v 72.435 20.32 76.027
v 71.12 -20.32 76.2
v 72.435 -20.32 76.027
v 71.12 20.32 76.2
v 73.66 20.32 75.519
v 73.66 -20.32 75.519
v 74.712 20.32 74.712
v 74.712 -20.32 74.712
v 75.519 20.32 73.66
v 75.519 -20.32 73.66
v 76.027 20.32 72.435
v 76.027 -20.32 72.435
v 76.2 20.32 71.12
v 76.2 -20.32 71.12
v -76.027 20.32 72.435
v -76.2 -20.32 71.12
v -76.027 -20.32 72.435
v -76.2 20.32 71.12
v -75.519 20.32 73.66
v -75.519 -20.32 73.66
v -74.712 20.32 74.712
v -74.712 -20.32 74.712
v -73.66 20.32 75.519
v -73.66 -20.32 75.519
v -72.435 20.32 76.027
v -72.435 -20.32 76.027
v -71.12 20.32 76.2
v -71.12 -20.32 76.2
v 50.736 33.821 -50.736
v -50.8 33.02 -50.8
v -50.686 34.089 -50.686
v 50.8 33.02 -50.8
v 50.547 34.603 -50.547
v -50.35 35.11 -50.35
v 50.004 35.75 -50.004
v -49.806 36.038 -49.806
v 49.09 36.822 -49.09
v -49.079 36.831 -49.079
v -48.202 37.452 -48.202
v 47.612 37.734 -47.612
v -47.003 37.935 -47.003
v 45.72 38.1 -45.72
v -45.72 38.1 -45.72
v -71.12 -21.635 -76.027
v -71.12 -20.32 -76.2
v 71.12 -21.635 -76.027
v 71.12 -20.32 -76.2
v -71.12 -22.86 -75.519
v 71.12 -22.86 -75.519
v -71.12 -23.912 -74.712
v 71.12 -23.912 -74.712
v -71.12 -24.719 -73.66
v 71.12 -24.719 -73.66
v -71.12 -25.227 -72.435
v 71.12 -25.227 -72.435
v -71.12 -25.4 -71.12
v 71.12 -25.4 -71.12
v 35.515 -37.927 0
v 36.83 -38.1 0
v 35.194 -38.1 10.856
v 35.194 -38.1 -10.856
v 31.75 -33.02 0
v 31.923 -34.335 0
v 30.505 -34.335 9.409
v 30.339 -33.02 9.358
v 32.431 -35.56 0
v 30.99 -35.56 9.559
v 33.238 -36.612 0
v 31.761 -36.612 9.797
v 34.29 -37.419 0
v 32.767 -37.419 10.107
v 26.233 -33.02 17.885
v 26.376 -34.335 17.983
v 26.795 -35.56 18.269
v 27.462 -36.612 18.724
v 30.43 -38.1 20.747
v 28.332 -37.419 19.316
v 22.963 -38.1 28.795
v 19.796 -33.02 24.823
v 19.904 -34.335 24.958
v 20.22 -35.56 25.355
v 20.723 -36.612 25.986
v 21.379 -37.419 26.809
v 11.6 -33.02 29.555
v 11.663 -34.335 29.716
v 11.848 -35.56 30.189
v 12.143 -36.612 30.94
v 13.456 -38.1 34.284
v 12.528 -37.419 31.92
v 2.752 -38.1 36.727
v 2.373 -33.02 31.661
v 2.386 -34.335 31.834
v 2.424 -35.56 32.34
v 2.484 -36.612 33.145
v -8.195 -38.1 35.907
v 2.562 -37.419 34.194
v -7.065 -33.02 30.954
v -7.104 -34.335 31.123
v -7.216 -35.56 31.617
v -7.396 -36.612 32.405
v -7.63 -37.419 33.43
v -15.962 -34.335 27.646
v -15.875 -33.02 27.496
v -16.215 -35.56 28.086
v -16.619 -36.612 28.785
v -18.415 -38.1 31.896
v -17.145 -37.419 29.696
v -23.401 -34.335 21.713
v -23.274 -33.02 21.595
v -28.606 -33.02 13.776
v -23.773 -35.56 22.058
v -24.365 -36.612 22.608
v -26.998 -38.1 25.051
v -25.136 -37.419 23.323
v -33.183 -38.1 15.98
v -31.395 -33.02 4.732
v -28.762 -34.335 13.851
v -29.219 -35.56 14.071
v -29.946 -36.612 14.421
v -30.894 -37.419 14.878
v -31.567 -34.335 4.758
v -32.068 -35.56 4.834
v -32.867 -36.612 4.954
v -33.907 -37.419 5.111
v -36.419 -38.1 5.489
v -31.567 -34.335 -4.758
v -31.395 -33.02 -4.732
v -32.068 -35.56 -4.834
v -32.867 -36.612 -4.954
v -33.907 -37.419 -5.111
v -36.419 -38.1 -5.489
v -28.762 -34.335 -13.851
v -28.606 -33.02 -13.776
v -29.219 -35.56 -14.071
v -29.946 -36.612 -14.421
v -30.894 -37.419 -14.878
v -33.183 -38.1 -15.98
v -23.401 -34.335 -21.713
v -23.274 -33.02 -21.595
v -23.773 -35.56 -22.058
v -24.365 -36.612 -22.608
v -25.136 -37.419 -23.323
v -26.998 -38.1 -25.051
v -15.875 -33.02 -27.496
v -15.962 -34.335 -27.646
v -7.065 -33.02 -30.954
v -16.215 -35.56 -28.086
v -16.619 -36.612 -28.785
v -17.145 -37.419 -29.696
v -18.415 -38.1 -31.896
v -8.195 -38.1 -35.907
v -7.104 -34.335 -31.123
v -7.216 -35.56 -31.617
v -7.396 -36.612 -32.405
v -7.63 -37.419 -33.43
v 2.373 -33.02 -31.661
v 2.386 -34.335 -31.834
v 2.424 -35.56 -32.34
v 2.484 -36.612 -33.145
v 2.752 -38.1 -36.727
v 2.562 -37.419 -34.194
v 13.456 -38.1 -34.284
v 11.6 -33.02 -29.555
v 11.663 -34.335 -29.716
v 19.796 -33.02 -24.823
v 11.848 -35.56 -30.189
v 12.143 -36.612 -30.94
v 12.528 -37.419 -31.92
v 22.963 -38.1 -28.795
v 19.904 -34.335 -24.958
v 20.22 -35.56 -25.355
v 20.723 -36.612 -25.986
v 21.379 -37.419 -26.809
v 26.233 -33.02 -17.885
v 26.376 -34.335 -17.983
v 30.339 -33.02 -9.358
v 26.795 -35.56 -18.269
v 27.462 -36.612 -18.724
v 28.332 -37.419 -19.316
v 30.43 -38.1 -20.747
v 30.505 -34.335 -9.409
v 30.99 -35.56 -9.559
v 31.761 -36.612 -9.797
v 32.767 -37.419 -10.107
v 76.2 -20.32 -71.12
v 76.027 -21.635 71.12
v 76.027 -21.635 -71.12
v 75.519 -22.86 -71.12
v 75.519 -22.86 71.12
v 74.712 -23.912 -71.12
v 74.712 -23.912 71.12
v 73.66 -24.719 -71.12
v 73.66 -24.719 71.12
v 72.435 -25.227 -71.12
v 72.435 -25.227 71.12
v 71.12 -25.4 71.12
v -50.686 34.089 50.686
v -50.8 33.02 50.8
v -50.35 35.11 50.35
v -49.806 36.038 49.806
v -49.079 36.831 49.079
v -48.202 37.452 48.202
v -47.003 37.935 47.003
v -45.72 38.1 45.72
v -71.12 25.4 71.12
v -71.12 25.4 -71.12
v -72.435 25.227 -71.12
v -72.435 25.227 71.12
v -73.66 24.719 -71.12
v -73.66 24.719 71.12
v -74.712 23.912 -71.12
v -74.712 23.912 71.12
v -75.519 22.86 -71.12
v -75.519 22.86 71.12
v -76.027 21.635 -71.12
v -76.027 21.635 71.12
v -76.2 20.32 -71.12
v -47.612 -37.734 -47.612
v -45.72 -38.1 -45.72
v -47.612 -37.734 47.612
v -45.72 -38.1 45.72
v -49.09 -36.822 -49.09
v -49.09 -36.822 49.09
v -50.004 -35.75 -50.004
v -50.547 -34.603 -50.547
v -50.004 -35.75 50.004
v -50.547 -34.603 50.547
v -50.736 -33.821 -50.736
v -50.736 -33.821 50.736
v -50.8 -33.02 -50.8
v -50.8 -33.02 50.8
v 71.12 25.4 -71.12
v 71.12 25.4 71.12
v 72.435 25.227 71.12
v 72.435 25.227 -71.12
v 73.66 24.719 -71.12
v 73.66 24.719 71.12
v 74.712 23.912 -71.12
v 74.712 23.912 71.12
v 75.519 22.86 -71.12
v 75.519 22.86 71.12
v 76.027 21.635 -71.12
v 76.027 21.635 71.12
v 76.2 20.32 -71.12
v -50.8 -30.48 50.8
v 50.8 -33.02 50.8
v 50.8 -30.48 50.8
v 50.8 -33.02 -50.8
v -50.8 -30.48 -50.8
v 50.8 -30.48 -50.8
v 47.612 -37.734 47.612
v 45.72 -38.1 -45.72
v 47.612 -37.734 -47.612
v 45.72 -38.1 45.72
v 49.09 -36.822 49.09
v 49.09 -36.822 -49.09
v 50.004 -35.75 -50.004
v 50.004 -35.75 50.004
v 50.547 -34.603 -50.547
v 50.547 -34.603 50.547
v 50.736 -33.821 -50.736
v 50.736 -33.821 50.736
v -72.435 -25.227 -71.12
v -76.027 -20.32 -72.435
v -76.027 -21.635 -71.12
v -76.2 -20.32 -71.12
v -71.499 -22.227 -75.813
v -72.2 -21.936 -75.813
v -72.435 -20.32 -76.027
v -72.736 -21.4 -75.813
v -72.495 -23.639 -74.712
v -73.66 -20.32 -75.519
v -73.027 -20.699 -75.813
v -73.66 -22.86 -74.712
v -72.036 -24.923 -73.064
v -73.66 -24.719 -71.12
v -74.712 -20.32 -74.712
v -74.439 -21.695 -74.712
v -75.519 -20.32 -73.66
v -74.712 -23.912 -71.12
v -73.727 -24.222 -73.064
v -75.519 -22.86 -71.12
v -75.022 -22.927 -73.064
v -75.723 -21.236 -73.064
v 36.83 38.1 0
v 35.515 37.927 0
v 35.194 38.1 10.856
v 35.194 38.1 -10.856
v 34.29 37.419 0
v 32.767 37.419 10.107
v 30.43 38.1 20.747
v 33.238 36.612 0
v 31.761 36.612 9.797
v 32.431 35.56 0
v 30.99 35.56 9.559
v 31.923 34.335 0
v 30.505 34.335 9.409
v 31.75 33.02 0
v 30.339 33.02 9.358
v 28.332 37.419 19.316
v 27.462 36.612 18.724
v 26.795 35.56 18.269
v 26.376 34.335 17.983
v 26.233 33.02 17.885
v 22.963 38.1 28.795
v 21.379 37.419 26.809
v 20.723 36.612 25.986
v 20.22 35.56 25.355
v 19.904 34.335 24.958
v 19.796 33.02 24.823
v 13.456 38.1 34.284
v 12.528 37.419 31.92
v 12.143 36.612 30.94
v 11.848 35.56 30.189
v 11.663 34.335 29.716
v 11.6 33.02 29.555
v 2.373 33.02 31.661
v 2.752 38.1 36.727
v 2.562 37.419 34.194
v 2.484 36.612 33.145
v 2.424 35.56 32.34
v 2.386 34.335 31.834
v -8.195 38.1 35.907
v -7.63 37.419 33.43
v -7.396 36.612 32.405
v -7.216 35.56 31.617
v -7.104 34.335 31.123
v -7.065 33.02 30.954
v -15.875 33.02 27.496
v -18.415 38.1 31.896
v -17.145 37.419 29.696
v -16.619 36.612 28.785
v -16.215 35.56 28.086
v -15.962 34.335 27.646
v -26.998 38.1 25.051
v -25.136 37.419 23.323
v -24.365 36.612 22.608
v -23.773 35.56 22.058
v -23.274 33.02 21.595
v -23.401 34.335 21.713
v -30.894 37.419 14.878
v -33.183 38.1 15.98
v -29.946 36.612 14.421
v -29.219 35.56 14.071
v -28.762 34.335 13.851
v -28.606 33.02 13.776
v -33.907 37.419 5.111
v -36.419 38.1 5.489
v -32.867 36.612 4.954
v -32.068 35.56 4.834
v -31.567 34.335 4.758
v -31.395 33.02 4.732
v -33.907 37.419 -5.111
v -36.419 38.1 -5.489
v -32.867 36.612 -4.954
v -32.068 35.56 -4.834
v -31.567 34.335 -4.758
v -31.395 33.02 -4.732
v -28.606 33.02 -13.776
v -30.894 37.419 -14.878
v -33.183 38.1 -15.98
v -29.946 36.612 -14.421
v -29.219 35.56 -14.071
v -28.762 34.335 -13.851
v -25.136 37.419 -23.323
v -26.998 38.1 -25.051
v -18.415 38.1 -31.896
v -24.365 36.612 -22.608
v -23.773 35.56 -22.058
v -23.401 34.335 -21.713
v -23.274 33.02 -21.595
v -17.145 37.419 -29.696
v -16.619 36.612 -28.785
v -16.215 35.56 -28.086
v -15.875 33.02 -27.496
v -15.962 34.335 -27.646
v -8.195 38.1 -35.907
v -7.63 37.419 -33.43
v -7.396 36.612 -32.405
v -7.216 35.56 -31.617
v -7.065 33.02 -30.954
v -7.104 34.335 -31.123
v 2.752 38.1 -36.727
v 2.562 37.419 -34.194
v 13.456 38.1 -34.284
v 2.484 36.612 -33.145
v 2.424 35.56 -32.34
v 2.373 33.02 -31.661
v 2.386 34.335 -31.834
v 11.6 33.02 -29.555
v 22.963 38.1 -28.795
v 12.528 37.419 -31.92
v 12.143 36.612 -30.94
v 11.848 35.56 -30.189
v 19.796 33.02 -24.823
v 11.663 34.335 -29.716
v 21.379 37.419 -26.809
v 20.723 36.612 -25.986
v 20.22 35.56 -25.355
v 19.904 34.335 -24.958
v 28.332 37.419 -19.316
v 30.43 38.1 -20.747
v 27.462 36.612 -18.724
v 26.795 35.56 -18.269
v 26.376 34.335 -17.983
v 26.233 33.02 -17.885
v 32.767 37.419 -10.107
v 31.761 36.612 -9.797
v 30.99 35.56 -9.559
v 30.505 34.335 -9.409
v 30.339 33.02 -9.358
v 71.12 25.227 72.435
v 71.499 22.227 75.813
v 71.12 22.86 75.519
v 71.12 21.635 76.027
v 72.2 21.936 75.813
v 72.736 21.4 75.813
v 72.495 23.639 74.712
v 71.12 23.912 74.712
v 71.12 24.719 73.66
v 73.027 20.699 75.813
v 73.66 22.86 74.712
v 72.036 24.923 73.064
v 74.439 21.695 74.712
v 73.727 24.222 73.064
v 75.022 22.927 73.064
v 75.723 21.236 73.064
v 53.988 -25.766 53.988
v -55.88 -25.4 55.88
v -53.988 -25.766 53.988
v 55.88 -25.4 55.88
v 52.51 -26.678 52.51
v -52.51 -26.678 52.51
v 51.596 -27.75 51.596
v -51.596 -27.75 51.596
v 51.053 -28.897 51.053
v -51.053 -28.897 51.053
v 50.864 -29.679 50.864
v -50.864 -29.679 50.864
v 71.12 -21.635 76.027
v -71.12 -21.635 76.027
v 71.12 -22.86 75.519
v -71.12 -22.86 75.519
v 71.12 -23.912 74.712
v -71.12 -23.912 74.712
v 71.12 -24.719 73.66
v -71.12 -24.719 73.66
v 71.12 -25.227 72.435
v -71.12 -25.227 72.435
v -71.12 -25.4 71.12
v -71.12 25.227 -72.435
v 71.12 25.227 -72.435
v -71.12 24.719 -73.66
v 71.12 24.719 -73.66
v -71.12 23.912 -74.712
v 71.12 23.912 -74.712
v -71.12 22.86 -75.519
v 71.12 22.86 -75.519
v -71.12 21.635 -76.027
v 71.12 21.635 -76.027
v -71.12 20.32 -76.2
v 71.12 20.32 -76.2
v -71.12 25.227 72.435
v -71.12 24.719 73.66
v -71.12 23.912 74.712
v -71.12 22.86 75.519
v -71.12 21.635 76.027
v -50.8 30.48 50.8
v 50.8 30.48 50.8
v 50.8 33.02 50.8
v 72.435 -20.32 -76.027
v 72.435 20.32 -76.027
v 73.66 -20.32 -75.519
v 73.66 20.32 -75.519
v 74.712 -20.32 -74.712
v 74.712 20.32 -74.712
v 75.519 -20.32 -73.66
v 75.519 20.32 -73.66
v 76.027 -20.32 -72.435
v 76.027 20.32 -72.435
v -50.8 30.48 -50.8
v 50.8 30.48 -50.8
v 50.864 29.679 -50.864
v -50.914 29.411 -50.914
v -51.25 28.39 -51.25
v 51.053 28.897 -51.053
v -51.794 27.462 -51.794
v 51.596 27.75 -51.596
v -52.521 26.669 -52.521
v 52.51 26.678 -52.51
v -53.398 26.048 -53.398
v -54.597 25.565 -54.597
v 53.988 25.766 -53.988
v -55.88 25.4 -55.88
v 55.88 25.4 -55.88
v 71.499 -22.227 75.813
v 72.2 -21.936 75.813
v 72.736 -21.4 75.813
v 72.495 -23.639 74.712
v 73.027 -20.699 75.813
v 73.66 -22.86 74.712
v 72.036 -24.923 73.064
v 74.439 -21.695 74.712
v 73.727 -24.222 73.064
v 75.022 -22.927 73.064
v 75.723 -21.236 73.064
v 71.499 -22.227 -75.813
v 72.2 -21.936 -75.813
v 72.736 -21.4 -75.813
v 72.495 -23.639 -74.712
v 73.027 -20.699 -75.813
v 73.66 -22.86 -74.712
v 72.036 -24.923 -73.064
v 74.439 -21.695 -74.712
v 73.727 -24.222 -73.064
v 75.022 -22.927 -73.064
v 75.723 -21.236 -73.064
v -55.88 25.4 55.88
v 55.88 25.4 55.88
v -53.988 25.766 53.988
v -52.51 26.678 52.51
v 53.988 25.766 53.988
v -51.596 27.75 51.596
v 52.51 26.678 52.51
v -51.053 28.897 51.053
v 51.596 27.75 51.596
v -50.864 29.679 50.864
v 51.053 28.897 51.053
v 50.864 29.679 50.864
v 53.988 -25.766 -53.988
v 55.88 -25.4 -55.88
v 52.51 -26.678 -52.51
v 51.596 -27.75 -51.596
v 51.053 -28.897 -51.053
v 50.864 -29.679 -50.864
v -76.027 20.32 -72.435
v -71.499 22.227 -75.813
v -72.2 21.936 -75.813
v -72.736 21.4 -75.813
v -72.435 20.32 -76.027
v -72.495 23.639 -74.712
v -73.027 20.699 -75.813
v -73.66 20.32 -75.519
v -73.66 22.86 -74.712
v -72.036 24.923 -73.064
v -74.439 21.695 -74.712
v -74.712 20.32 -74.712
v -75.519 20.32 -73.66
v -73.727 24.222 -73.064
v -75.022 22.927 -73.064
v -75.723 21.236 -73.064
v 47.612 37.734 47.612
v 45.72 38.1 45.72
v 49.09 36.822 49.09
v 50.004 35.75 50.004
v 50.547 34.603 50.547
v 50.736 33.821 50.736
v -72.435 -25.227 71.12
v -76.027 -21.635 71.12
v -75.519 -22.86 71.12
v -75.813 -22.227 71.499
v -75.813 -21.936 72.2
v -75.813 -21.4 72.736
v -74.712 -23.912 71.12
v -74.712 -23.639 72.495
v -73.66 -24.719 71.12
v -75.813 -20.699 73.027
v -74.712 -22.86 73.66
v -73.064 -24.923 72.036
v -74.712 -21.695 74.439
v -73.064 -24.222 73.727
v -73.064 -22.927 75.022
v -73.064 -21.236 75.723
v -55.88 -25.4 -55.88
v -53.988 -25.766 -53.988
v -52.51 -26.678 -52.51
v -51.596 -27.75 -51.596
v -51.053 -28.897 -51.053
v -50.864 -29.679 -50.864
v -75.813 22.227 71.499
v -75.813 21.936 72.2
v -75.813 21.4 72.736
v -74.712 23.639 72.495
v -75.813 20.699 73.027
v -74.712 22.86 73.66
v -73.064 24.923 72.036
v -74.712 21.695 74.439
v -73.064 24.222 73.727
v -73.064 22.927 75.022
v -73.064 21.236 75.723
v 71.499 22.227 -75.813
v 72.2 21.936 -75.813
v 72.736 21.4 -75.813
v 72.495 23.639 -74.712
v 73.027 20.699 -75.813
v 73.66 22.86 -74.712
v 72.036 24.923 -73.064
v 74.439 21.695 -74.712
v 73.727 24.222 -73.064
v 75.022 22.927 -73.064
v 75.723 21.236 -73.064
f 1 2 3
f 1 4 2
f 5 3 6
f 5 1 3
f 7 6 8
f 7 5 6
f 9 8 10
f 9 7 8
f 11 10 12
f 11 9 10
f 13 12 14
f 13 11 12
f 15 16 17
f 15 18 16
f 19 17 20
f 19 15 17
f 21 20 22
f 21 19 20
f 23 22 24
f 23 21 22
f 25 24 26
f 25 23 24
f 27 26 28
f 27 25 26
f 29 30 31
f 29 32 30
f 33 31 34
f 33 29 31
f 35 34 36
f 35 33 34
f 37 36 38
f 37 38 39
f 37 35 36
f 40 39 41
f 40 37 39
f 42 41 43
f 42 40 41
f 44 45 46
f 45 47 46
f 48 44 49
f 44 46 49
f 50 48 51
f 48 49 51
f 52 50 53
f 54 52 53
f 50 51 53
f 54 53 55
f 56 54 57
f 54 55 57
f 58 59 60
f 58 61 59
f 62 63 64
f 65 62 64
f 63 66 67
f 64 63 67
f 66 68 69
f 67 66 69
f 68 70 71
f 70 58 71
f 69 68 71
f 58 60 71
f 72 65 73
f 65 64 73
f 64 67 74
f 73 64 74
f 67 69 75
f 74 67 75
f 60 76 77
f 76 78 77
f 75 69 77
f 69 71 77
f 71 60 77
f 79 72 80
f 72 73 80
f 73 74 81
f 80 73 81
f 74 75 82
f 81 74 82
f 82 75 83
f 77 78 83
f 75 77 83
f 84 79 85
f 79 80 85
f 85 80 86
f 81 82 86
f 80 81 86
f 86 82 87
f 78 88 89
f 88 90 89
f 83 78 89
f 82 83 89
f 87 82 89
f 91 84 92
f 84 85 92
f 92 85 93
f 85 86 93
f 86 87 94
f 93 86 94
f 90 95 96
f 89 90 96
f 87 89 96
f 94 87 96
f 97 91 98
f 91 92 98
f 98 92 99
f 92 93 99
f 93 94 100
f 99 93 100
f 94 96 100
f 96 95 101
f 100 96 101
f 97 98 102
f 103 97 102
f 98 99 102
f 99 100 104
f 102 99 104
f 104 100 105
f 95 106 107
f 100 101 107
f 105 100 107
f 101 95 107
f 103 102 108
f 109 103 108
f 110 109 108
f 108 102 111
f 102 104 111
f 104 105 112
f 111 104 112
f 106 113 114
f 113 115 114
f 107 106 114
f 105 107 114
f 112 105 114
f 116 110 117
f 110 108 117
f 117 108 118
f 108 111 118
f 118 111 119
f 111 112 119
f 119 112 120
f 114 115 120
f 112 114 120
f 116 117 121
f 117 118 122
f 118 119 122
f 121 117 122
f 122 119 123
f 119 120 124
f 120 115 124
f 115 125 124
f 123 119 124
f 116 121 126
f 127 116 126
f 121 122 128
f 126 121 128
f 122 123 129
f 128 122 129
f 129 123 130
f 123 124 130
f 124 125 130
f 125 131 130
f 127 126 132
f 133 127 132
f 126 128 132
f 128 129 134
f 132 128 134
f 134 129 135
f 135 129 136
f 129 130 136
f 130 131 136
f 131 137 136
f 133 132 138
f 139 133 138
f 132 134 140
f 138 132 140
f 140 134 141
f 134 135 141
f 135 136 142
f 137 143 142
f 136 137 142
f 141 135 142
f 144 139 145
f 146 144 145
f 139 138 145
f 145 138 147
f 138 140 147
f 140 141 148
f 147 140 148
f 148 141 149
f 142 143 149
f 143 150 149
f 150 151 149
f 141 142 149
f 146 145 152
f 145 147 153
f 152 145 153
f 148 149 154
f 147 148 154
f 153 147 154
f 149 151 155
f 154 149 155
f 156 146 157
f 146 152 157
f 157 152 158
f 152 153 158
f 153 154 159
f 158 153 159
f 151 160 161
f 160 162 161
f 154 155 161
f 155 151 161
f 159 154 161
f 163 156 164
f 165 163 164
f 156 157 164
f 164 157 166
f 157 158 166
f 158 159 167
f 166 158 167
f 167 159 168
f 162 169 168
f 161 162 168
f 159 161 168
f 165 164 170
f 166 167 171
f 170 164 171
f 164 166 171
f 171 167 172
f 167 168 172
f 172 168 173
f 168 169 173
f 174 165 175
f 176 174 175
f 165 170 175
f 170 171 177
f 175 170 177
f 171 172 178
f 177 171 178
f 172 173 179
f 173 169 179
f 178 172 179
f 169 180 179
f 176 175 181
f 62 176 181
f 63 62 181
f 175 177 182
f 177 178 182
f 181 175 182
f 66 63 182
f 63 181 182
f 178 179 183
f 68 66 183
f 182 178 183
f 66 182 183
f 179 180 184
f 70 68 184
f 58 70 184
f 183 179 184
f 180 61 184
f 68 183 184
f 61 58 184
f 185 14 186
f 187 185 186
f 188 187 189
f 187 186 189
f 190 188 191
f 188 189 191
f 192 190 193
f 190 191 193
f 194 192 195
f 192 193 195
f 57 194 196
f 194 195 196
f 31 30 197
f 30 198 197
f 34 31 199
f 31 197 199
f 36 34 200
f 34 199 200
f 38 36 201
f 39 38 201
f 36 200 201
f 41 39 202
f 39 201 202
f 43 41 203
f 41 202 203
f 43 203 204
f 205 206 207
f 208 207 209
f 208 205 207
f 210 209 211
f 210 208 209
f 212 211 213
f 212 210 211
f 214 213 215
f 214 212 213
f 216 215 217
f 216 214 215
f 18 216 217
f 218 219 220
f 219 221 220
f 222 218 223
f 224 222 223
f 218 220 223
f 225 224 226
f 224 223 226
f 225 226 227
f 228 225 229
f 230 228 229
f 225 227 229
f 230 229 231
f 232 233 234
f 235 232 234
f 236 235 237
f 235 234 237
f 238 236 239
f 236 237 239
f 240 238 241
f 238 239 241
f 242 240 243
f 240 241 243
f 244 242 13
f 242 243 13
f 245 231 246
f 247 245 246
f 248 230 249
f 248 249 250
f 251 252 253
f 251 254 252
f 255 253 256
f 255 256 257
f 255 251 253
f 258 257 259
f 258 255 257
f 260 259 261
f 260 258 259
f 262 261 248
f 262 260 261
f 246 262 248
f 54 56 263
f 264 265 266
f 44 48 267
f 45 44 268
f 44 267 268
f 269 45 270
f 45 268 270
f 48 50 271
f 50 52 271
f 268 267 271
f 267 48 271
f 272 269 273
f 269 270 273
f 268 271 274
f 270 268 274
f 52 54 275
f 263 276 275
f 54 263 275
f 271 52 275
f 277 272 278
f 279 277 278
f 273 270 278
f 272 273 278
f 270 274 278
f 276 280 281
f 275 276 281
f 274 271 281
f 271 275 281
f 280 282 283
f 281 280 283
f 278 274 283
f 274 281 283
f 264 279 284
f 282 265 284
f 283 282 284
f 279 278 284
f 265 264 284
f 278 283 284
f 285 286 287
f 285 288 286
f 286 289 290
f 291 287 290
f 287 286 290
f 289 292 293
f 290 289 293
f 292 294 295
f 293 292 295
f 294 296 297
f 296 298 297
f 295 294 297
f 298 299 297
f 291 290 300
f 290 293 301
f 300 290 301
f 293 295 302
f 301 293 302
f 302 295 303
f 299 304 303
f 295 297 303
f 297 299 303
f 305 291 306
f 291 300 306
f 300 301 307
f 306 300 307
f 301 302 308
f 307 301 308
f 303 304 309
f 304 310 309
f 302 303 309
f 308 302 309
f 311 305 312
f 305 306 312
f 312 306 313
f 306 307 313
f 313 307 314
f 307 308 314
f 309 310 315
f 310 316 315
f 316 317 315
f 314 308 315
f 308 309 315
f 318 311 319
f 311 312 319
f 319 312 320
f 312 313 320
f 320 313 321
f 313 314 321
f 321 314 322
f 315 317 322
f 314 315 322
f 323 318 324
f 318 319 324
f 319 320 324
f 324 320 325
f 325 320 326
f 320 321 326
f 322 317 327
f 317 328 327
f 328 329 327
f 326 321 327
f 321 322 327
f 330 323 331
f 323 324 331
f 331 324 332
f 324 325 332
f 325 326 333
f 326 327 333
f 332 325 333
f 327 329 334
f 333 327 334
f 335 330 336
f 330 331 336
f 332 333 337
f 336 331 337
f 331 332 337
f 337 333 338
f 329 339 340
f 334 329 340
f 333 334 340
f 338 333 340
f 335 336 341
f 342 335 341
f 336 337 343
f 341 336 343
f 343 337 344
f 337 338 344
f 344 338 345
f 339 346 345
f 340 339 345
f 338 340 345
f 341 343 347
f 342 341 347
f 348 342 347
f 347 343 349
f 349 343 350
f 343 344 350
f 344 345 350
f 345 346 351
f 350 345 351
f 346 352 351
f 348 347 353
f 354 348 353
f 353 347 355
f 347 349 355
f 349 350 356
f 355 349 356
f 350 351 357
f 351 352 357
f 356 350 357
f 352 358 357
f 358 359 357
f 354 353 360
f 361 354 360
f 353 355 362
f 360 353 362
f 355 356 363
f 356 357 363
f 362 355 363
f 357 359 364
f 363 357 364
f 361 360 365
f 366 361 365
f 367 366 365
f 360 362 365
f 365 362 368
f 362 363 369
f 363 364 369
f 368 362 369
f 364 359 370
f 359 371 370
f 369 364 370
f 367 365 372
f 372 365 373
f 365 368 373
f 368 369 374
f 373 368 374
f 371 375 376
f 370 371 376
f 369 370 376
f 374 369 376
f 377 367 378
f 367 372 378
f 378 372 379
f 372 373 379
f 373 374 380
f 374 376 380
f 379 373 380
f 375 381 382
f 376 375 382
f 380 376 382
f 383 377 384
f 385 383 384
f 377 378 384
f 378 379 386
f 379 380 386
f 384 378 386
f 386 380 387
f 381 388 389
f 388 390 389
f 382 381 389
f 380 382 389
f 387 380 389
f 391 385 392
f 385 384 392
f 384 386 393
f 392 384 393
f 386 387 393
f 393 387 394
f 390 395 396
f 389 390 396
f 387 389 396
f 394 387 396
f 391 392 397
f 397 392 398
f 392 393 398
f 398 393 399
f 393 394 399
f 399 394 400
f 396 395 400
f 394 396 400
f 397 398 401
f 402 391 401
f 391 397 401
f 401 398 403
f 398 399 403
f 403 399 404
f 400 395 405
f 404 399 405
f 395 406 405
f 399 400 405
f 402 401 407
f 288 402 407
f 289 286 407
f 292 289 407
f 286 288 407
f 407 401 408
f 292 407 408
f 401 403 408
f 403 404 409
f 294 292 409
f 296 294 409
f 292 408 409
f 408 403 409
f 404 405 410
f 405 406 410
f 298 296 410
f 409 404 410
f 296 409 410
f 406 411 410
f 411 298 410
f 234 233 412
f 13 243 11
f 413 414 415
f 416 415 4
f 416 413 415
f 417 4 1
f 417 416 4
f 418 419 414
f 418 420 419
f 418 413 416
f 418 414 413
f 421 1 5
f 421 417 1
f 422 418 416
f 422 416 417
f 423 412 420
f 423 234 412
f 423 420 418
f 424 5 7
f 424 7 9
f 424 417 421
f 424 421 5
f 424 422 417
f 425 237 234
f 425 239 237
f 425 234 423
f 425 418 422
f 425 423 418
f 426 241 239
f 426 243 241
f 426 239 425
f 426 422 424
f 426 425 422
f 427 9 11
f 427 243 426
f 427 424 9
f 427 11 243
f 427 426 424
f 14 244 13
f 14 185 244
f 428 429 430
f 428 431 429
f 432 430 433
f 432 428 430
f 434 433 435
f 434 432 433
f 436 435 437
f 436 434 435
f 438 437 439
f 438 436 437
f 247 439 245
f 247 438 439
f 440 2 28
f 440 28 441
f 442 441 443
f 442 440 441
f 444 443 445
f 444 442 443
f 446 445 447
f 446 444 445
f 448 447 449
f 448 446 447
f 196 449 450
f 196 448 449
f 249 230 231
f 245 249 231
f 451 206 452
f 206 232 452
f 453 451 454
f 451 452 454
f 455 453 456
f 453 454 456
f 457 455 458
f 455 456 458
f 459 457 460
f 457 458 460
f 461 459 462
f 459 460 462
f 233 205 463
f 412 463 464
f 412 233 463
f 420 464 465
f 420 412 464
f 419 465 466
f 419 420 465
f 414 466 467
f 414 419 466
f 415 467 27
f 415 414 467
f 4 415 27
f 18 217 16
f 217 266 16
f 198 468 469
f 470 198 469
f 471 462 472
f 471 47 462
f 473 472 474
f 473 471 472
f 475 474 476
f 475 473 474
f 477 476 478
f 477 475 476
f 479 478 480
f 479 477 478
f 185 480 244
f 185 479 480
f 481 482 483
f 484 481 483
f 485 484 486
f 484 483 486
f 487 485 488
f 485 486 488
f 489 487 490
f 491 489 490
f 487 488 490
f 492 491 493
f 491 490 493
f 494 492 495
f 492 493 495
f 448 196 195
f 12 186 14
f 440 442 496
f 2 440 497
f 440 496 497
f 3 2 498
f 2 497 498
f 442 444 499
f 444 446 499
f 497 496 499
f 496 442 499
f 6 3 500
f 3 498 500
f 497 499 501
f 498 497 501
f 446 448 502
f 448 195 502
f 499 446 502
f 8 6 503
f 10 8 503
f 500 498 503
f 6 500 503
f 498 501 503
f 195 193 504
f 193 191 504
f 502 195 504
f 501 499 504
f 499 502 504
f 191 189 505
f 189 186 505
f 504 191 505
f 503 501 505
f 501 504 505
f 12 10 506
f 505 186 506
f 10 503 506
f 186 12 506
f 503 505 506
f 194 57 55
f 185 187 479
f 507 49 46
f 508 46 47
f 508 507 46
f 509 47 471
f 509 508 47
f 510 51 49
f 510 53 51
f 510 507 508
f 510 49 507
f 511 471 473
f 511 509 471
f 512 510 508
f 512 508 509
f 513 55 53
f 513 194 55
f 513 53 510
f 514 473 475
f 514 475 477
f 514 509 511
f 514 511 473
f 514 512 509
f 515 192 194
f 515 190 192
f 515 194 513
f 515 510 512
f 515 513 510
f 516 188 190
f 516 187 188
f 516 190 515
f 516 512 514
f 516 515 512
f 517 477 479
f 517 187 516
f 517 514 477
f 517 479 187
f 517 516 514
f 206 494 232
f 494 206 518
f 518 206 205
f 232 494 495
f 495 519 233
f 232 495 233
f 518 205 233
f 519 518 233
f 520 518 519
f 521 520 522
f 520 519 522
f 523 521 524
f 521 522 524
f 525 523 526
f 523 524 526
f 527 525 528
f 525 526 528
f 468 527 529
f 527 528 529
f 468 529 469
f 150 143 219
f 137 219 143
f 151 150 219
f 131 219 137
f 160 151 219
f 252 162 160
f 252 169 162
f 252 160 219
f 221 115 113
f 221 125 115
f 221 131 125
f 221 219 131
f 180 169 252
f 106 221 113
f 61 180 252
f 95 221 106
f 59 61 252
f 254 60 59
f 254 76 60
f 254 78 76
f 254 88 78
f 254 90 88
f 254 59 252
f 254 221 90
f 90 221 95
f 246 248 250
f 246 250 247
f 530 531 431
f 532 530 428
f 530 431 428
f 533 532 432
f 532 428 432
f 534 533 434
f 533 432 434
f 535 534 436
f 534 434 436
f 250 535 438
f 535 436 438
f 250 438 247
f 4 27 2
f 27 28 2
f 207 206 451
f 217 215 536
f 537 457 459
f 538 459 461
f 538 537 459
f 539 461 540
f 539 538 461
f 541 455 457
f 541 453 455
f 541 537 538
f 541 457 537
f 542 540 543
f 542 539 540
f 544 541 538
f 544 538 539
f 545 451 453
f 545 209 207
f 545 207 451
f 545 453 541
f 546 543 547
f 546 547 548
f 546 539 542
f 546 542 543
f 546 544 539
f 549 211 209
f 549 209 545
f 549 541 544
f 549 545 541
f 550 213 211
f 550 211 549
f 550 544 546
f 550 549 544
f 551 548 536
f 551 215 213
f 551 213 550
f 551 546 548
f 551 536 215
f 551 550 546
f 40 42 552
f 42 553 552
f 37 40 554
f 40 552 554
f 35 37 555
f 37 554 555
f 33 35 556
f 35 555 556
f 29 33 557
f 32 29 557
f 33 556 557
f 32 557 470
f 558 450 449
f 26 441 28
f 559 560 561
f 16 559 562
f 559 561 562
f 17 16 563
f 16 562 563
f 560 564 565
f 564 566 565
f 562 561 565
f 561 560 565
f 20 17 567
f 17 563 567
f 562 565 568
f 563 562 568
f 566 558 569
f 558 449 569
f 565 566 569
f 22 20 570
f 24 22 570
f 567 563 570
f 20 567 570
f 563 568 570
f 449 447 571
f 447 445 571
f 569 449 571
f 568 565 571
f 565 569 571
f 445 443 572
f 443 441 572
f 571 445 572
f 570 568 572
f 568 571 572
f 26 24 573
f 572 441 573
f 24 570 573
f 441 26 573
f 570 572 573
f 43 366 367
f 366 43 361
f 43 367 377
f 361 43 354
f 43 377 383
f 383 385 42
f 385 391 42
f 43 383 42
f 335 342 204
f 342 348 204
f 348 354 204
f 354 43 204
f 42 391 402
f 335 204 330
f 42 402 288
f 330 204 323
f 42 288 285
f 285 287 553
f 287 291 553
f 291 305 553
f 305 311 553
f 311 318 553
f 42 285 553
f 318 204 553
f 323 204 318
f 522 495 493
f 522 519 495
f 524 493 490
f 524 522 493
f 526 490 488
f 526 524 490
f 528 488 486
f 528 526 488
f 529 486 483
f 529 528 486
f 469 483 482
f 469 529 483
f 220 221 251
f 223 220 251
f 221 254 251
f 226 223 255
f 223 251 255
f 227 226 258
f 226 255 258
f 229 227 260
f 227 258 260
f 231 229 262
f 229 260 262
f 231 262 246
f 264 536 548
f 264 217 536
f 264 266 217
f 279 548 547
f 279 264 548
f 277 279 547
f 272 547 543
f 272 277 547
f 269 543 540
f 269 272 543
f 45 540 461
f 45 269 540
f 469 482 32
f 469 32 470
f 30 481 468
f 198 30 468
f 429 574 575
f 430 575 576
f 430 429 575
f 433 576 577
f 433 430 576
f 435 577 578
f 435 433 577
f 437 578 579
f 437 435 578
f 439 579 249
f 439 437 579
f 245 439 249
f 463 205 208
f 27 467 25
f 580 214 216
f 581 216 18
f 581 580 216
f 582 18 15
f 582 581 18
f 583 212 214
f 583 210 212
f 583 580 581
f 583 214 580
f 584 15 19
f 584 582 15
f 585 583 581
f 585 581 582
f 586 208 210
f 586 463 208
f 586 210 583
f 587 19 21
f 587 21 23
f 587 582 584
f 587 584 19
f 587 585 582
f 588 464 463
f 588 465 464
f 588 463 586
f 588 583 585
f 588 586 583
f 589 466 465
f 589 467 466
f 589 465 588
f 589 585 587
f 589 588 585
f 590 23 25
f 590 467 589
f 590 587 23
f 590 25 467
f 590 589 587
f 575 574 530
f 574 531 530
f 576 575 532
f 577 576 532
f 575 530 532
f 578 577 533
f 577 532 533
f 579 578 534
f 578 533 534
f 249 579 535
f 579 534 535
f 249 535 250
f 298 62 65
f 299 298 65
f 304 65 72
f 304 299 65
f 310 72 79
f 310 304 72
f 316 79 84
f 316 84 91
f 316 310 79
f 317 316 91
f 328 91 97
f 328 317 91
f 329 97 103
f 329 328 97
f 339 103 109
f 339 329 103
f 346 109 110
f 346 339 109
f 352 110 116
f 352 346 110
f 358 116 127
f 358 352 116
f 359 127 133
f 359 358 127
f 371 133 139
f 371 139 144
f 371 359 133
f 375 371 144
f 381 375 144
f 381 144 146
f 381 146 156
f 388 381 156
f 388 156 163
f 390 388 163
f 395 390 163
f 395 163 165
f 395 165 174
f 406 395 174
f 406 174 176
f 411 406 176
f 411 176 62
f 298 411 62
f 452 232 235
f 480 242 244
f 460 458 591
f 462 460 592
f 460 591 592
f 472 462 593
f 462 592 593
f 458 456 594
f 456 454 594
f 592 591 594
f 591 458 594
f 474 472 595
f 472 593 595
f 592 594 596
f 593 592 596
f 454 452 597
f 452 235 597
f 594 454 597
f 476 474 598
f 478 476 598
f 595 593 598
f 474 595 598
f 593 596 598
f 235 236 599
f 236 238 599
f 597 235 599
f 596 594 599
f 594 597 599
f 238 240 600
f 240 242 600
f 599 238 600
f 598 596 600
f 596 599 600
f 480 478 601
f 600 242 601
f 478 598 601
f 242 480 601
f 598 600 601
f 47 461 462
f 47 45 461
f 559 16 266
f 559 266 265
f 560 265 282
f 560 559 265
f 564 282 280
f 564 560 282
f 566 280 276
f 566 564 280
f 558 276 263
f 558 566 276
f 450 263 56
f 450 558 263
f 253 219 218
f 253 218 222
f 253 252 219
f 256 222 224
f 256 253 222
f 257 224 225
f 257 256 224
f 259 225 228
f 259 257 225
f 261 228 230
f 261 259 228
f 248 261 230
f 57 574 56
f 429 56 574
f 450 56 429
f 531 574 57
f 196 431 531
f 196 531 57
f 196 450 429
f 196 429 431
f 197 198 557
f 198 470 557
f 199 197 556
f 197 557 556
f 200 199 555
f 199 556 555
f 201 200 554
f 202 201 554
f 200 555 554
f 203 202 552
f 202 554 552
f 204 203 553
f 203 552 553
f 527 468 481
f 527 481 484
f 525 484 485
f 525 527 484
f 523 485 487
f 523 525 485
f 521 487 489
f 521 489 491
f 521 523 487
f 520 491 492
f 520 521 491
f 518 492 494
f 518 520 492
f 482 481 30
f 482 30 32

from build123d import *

# Parameters (mm, degrees)
F0_W     = 101.6
F0_H     = 101.6
F0_R     = 31.75
F1_DEPTH = 38.1
F0_W_2   = 152.4
F0_H_2   = 152.4
F2_DEPTH = 25.4
F3_R     = 5.08


with BuildPart() as f1:
    # F0 (on Front) → F1 (new body, symmetric)
    with BuildSketch(Plane.XZ):
        Rectangle(F0_W, F0_H)
        Circle(F0_R, mode=Mode.SUBTRACT)
    extrude(amount=F1_DEPTH, both=True)

    # F0 (on Front) → F2 (join, symmetric)
    with BuildSketch(Plane.XZ):
        Rectangle(F0_W_2, F0_H_2)
        Rectangle(F0_W, F0_H, mode=Mode.SUBTRACT)
    extrude(amount=F2_DEPTH, both=True)

    # F3
    f3_edges = [f1.edges().sort_by_distance(p)[0] for p in [
        (76.2, 25.4, 0),
        (0, 25.4, 76.2),
        (-76.2, 25.4, 0),
        (0, 25.4, -76.2),
        (0, 25.4, 50.8),
        (50.8, 25.4, 0),
        (0, 25.4, -50.8),
        (-50.8, 25.4, 0),
        (50.8, 38.1, 0),
        (0, 38.1, 50.8),
        (-50.8, 38.1, 0),
        (0, 38.1, -50.8),
        (-31.75, 38.1, 0),
        (50.8, -38.1, 0),
        (0, -38.1, 50.8),
        (-50.8, -38.1, 0),
        (0, -38.1, -50.8),
        (-31.75, -38.1, 0),
        (76.2, -25.4, 0),
        (0, -25.4, 76.2),
        (-76.2, -25.4, 0),
        (0, -25.4, -76.2),
        (0, -25.4, 50.8),
        (50.8, -25.4, 0),
        (0, -25.4, -50.8),
        (-50.8, -25.4, 0),
        (76.2, 0, -76.2),
        (-76.2, 0, -76.2),
        (76.2, 0, 76.2),
        (-76.2, 0, 76.2),
    ]]
    fillet(f3_edges, radius=F3_R)


solid = f1.part
